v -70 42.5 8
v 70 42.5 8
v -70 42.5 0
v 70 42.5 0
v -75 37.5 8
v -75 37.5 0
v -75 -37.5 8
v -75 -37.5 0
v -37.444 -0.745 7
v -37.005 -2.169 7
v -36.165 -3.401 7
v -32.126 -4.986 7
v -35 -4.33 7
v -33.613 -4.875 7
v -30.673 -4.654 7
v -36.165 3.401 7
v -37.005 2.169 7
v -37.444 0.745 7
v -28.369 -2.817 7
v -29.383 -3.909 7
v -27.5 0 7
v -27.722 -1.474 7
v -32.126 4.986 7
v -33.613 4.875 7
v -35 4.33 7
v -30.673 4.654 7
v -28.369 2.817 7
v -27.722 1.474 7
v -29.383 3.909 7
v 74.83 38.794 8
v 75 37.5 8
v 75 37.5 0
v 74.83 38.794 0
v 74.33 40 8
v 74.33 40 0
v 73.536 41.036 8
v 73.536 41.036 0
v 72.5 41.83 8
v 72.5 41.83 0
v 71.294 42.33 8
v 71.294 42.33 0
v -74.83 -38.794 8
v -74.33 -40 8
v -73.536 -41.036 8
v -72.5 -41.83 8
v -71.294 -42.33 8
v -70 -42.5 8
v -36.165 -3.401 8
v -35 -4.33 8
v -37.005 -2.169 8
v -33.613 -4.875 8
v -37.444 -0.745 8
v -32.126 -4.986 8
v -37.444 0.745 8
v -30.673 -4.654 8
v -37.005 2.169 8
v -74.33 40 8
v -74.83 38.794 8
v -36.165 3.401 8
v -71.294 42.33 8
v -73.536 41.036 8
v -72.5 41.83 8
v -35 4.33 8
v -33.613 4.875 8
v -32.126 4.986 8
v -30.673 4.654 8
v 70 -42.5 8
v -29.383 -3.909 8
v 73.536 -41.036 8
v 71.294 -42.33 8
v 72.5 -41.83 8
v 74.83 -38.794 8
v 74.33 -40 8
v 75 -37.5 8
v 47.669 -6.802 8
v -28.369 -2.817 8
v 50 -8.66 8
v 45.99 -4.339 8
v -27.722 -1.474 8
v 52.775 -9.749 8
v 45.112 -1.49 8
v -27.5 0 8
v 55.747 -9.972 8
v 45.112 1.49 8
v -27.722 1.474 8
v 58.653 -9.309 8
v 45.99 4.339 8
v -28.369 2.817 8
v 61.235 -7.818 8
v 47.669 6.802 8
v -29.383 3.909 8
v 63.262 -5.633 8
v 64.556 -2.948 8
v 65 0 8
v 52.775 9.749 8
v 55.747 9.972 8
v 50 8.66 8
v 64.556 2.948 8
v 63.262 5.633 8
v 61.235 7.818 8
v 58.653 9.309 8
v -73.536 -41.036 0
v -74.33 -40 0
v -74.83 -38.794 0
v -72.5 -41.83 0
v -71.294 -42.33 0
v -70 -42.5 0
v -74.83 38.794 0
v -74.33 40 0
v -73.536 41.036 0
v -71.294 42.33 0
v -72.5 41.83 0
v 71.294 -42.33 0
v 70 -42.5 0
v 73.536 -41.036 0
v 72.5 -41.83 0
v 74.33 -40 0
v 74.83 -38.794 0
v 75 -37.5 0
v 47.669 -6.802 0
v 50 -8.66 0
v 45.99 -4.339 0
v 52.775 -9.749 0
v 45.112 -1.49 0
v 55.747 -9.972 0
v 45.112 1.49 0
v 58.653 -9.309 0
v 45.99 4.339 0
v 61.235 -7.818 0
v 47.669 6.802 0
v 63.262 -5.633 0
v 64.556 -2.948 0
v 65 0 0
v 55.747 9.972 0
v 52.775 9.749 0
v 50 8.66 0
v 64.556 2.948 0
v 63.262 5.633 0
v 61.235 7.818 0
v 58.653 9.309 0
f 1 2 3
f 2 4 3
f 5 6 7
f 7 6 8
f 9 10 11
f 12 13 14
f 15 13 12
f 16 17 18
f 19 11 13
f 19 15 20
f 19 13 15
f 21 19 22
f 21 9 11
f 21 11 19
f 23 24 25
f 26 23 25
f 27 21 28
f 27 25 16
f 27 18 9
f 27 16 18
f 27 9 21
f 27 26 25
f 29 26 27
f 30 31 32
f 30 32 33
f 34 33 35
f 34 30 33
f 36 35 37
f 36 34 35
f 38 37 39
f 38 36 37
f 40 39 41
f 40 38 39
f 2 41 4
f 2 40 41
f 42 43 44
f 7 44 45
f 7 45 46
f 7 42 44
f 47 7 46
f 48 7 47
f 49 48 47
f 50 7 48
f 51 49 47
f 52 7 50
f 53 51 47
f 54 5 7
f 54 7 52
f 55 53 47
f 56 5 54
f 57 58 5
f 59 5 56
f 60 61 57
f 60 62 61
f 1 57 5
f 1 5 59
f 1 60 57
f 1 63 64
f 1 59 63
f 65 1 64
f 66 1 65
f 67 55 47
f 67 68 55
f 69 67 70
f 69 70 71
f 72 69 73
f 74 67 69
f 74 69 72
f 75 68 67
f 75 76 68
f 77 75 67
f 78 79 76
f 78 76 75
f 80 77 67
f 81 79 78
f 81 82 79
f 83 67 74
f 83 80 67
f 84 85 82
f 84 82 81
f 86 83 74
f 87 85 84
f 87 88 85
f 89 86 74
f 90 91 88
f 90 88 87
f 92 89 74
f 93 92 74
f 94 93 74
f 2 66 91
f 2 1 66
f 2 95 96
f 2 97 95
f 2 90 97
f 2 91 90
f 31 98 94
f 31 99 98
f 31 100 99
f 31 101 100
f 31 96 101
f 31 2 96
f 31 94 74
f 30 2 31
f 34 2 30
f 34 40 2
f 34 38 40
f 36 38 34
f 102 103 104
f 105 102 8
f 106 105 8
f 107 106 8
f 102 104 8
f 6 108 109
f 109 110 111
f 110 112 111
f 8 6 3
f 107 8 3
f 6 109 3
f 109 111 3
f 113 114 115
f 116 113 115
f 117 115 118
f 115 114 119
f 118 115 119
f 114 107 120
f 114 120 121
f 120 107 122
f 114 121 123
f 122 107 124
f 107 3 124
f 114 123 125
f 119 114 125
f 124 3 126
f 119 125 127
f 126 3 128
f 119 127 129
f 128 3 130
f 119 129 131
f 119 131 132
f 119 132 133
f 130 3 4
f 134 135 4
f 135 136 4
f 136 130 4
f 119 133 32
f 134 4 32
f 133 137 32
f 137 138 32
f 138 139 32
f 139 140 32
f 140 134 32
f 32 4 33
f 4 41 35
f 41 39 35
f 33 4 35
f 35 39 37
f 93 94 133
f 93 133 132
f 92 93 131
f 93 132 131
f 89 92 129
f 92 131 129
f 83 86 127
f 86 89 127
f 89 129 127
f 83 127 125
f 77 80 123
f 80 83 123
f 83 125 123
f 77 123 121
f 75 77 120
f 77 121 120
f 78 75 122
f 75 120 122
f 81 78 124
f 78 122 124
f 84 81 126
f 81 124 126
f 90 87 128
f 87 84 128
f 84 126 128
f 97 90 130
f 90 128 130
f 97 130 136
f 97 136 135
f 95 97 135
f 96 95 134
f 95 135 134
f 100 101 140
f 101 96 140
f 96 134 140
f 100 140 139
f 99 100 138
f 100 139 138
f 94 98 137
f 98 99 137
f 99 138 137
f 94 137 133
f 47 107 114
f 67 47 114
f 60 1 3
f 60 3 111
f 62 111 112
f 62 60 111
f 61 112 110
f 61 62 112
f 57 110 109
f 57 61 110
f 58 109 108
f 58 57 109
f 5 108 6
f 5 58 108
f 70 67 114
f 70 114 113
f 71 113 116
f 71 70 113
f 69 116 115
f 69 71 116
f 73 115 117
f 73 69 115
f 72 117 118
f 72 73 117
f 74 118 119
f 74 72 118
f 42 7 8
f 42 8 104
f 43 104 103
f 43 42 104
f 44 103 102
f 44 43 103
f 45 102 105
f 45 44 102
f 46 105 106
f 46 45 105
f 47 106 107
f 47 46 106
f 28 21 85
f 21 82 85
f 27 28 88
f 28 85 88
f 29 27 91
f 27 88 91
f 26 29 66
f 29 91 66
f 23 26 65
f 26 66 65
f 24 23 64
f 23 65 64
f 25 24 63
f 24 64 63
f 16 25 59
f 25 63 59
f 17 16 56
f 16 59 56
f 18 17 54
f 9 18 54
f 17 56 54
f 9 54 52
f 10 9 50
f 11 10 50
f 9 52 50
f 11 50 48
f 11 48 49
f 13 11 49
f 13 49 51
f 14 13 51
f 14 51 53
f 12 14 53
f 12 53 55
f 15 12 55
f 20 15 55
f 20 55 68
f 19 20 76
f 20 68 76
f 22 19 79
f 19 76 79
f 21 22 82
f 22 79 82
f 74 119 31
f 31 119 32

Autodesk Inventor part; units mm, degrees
ref_plane "YZ Plane" through (0, 0, 0) normal (1, 0, 0) x (0, 1, 0)
ref_plane "XZ Plane" through (0, 0, 0) normal (0, 1, 0) x (-1, 0, 0)
ref_plane "XY Plane" through (0, 0, 0) normal (0, 0, 1) x (1, 0, 0)
sketch "Sketch1" plane through (0, 0, 0) normal (0, 0, 1) x (1, 0, 0)
  line L0 (-75, -42.5) -> (75, -42.5)
  line L1 (75, -42.5) -> (75, 42.5)
  line L2 (75, 42.5) -> (-75, 42.5)
  line L3 (-75, 42.5) -> (-75, -42.5)
  line L4 (-75, -42.5) -> (75, 42.5) construction
  line L5 (75, -42.5) -> (-75, 42.5) construction
  circle A0 centre (55, -22.5) radius 10
  circle A1 centre (55, 22.5) radius 10
  line L6 (0, 0) -> (75, 0) construction
  circle A2 centre (55, 0) radius 10
  dimension "d0" = 150
  dimension "d1" = 85
  dimension "d23" = 20
  dimension "d25" = 20
  dimension "d26" = 20
extrude "Plate1" add sketch "Sketch1" along normal blind 8 contours L3 L2 L1 L0 | A0 | A1
fillet "Corner Round1" radius 5 4 edges at (75, -42.5, 4) (-75, -42.5, 4) (-75, 42.5, 4) (75, 42.5, 4)
sketch "Sketch5" plane through (0, 0, 8) normal (0, 0, 1) x (1, 0, 0)
  line L0 (70, -42.5) -> (-70, -42.5) projected
  line L1 (-75, -37.5) -> (-75, 37.5) projected
  line L2 (-70, 42.5) -> (70, 42.5) projected
  circle A0 centre (-32.5, 0) radius 42.5
  circle A1 centre (-32.5, 0) radius 5
  point P0 (0, 0)
  dimension "d27" = 10
extrude "Extrusion2" cut sketch "Sketch5" against normal blind 1 contours A1
equation "\"d26\" = d25"
equation "\"d2\" = Thickness"
equation "\"BendReliefWidth\" = Thickness"
equation "\"BendReliefDepth\" = 0.5 * Thickness"
equation "\"CornerReliefSize\" = 4 * Thickness"
equation "\"MinimumRemnant\" = 2 * Thickness"
equation "\"TransitionRadius\" = BendRadius"
equation "\"JacobiRadiusSize\" = BendRadius"
equation "\"GapSize\" = Thickness"
equation "\"Thickness\" = 8"
equation "\"BendRadius\" = 5"
properties part number "PNS-783 leg floor plate" material "Steel"
